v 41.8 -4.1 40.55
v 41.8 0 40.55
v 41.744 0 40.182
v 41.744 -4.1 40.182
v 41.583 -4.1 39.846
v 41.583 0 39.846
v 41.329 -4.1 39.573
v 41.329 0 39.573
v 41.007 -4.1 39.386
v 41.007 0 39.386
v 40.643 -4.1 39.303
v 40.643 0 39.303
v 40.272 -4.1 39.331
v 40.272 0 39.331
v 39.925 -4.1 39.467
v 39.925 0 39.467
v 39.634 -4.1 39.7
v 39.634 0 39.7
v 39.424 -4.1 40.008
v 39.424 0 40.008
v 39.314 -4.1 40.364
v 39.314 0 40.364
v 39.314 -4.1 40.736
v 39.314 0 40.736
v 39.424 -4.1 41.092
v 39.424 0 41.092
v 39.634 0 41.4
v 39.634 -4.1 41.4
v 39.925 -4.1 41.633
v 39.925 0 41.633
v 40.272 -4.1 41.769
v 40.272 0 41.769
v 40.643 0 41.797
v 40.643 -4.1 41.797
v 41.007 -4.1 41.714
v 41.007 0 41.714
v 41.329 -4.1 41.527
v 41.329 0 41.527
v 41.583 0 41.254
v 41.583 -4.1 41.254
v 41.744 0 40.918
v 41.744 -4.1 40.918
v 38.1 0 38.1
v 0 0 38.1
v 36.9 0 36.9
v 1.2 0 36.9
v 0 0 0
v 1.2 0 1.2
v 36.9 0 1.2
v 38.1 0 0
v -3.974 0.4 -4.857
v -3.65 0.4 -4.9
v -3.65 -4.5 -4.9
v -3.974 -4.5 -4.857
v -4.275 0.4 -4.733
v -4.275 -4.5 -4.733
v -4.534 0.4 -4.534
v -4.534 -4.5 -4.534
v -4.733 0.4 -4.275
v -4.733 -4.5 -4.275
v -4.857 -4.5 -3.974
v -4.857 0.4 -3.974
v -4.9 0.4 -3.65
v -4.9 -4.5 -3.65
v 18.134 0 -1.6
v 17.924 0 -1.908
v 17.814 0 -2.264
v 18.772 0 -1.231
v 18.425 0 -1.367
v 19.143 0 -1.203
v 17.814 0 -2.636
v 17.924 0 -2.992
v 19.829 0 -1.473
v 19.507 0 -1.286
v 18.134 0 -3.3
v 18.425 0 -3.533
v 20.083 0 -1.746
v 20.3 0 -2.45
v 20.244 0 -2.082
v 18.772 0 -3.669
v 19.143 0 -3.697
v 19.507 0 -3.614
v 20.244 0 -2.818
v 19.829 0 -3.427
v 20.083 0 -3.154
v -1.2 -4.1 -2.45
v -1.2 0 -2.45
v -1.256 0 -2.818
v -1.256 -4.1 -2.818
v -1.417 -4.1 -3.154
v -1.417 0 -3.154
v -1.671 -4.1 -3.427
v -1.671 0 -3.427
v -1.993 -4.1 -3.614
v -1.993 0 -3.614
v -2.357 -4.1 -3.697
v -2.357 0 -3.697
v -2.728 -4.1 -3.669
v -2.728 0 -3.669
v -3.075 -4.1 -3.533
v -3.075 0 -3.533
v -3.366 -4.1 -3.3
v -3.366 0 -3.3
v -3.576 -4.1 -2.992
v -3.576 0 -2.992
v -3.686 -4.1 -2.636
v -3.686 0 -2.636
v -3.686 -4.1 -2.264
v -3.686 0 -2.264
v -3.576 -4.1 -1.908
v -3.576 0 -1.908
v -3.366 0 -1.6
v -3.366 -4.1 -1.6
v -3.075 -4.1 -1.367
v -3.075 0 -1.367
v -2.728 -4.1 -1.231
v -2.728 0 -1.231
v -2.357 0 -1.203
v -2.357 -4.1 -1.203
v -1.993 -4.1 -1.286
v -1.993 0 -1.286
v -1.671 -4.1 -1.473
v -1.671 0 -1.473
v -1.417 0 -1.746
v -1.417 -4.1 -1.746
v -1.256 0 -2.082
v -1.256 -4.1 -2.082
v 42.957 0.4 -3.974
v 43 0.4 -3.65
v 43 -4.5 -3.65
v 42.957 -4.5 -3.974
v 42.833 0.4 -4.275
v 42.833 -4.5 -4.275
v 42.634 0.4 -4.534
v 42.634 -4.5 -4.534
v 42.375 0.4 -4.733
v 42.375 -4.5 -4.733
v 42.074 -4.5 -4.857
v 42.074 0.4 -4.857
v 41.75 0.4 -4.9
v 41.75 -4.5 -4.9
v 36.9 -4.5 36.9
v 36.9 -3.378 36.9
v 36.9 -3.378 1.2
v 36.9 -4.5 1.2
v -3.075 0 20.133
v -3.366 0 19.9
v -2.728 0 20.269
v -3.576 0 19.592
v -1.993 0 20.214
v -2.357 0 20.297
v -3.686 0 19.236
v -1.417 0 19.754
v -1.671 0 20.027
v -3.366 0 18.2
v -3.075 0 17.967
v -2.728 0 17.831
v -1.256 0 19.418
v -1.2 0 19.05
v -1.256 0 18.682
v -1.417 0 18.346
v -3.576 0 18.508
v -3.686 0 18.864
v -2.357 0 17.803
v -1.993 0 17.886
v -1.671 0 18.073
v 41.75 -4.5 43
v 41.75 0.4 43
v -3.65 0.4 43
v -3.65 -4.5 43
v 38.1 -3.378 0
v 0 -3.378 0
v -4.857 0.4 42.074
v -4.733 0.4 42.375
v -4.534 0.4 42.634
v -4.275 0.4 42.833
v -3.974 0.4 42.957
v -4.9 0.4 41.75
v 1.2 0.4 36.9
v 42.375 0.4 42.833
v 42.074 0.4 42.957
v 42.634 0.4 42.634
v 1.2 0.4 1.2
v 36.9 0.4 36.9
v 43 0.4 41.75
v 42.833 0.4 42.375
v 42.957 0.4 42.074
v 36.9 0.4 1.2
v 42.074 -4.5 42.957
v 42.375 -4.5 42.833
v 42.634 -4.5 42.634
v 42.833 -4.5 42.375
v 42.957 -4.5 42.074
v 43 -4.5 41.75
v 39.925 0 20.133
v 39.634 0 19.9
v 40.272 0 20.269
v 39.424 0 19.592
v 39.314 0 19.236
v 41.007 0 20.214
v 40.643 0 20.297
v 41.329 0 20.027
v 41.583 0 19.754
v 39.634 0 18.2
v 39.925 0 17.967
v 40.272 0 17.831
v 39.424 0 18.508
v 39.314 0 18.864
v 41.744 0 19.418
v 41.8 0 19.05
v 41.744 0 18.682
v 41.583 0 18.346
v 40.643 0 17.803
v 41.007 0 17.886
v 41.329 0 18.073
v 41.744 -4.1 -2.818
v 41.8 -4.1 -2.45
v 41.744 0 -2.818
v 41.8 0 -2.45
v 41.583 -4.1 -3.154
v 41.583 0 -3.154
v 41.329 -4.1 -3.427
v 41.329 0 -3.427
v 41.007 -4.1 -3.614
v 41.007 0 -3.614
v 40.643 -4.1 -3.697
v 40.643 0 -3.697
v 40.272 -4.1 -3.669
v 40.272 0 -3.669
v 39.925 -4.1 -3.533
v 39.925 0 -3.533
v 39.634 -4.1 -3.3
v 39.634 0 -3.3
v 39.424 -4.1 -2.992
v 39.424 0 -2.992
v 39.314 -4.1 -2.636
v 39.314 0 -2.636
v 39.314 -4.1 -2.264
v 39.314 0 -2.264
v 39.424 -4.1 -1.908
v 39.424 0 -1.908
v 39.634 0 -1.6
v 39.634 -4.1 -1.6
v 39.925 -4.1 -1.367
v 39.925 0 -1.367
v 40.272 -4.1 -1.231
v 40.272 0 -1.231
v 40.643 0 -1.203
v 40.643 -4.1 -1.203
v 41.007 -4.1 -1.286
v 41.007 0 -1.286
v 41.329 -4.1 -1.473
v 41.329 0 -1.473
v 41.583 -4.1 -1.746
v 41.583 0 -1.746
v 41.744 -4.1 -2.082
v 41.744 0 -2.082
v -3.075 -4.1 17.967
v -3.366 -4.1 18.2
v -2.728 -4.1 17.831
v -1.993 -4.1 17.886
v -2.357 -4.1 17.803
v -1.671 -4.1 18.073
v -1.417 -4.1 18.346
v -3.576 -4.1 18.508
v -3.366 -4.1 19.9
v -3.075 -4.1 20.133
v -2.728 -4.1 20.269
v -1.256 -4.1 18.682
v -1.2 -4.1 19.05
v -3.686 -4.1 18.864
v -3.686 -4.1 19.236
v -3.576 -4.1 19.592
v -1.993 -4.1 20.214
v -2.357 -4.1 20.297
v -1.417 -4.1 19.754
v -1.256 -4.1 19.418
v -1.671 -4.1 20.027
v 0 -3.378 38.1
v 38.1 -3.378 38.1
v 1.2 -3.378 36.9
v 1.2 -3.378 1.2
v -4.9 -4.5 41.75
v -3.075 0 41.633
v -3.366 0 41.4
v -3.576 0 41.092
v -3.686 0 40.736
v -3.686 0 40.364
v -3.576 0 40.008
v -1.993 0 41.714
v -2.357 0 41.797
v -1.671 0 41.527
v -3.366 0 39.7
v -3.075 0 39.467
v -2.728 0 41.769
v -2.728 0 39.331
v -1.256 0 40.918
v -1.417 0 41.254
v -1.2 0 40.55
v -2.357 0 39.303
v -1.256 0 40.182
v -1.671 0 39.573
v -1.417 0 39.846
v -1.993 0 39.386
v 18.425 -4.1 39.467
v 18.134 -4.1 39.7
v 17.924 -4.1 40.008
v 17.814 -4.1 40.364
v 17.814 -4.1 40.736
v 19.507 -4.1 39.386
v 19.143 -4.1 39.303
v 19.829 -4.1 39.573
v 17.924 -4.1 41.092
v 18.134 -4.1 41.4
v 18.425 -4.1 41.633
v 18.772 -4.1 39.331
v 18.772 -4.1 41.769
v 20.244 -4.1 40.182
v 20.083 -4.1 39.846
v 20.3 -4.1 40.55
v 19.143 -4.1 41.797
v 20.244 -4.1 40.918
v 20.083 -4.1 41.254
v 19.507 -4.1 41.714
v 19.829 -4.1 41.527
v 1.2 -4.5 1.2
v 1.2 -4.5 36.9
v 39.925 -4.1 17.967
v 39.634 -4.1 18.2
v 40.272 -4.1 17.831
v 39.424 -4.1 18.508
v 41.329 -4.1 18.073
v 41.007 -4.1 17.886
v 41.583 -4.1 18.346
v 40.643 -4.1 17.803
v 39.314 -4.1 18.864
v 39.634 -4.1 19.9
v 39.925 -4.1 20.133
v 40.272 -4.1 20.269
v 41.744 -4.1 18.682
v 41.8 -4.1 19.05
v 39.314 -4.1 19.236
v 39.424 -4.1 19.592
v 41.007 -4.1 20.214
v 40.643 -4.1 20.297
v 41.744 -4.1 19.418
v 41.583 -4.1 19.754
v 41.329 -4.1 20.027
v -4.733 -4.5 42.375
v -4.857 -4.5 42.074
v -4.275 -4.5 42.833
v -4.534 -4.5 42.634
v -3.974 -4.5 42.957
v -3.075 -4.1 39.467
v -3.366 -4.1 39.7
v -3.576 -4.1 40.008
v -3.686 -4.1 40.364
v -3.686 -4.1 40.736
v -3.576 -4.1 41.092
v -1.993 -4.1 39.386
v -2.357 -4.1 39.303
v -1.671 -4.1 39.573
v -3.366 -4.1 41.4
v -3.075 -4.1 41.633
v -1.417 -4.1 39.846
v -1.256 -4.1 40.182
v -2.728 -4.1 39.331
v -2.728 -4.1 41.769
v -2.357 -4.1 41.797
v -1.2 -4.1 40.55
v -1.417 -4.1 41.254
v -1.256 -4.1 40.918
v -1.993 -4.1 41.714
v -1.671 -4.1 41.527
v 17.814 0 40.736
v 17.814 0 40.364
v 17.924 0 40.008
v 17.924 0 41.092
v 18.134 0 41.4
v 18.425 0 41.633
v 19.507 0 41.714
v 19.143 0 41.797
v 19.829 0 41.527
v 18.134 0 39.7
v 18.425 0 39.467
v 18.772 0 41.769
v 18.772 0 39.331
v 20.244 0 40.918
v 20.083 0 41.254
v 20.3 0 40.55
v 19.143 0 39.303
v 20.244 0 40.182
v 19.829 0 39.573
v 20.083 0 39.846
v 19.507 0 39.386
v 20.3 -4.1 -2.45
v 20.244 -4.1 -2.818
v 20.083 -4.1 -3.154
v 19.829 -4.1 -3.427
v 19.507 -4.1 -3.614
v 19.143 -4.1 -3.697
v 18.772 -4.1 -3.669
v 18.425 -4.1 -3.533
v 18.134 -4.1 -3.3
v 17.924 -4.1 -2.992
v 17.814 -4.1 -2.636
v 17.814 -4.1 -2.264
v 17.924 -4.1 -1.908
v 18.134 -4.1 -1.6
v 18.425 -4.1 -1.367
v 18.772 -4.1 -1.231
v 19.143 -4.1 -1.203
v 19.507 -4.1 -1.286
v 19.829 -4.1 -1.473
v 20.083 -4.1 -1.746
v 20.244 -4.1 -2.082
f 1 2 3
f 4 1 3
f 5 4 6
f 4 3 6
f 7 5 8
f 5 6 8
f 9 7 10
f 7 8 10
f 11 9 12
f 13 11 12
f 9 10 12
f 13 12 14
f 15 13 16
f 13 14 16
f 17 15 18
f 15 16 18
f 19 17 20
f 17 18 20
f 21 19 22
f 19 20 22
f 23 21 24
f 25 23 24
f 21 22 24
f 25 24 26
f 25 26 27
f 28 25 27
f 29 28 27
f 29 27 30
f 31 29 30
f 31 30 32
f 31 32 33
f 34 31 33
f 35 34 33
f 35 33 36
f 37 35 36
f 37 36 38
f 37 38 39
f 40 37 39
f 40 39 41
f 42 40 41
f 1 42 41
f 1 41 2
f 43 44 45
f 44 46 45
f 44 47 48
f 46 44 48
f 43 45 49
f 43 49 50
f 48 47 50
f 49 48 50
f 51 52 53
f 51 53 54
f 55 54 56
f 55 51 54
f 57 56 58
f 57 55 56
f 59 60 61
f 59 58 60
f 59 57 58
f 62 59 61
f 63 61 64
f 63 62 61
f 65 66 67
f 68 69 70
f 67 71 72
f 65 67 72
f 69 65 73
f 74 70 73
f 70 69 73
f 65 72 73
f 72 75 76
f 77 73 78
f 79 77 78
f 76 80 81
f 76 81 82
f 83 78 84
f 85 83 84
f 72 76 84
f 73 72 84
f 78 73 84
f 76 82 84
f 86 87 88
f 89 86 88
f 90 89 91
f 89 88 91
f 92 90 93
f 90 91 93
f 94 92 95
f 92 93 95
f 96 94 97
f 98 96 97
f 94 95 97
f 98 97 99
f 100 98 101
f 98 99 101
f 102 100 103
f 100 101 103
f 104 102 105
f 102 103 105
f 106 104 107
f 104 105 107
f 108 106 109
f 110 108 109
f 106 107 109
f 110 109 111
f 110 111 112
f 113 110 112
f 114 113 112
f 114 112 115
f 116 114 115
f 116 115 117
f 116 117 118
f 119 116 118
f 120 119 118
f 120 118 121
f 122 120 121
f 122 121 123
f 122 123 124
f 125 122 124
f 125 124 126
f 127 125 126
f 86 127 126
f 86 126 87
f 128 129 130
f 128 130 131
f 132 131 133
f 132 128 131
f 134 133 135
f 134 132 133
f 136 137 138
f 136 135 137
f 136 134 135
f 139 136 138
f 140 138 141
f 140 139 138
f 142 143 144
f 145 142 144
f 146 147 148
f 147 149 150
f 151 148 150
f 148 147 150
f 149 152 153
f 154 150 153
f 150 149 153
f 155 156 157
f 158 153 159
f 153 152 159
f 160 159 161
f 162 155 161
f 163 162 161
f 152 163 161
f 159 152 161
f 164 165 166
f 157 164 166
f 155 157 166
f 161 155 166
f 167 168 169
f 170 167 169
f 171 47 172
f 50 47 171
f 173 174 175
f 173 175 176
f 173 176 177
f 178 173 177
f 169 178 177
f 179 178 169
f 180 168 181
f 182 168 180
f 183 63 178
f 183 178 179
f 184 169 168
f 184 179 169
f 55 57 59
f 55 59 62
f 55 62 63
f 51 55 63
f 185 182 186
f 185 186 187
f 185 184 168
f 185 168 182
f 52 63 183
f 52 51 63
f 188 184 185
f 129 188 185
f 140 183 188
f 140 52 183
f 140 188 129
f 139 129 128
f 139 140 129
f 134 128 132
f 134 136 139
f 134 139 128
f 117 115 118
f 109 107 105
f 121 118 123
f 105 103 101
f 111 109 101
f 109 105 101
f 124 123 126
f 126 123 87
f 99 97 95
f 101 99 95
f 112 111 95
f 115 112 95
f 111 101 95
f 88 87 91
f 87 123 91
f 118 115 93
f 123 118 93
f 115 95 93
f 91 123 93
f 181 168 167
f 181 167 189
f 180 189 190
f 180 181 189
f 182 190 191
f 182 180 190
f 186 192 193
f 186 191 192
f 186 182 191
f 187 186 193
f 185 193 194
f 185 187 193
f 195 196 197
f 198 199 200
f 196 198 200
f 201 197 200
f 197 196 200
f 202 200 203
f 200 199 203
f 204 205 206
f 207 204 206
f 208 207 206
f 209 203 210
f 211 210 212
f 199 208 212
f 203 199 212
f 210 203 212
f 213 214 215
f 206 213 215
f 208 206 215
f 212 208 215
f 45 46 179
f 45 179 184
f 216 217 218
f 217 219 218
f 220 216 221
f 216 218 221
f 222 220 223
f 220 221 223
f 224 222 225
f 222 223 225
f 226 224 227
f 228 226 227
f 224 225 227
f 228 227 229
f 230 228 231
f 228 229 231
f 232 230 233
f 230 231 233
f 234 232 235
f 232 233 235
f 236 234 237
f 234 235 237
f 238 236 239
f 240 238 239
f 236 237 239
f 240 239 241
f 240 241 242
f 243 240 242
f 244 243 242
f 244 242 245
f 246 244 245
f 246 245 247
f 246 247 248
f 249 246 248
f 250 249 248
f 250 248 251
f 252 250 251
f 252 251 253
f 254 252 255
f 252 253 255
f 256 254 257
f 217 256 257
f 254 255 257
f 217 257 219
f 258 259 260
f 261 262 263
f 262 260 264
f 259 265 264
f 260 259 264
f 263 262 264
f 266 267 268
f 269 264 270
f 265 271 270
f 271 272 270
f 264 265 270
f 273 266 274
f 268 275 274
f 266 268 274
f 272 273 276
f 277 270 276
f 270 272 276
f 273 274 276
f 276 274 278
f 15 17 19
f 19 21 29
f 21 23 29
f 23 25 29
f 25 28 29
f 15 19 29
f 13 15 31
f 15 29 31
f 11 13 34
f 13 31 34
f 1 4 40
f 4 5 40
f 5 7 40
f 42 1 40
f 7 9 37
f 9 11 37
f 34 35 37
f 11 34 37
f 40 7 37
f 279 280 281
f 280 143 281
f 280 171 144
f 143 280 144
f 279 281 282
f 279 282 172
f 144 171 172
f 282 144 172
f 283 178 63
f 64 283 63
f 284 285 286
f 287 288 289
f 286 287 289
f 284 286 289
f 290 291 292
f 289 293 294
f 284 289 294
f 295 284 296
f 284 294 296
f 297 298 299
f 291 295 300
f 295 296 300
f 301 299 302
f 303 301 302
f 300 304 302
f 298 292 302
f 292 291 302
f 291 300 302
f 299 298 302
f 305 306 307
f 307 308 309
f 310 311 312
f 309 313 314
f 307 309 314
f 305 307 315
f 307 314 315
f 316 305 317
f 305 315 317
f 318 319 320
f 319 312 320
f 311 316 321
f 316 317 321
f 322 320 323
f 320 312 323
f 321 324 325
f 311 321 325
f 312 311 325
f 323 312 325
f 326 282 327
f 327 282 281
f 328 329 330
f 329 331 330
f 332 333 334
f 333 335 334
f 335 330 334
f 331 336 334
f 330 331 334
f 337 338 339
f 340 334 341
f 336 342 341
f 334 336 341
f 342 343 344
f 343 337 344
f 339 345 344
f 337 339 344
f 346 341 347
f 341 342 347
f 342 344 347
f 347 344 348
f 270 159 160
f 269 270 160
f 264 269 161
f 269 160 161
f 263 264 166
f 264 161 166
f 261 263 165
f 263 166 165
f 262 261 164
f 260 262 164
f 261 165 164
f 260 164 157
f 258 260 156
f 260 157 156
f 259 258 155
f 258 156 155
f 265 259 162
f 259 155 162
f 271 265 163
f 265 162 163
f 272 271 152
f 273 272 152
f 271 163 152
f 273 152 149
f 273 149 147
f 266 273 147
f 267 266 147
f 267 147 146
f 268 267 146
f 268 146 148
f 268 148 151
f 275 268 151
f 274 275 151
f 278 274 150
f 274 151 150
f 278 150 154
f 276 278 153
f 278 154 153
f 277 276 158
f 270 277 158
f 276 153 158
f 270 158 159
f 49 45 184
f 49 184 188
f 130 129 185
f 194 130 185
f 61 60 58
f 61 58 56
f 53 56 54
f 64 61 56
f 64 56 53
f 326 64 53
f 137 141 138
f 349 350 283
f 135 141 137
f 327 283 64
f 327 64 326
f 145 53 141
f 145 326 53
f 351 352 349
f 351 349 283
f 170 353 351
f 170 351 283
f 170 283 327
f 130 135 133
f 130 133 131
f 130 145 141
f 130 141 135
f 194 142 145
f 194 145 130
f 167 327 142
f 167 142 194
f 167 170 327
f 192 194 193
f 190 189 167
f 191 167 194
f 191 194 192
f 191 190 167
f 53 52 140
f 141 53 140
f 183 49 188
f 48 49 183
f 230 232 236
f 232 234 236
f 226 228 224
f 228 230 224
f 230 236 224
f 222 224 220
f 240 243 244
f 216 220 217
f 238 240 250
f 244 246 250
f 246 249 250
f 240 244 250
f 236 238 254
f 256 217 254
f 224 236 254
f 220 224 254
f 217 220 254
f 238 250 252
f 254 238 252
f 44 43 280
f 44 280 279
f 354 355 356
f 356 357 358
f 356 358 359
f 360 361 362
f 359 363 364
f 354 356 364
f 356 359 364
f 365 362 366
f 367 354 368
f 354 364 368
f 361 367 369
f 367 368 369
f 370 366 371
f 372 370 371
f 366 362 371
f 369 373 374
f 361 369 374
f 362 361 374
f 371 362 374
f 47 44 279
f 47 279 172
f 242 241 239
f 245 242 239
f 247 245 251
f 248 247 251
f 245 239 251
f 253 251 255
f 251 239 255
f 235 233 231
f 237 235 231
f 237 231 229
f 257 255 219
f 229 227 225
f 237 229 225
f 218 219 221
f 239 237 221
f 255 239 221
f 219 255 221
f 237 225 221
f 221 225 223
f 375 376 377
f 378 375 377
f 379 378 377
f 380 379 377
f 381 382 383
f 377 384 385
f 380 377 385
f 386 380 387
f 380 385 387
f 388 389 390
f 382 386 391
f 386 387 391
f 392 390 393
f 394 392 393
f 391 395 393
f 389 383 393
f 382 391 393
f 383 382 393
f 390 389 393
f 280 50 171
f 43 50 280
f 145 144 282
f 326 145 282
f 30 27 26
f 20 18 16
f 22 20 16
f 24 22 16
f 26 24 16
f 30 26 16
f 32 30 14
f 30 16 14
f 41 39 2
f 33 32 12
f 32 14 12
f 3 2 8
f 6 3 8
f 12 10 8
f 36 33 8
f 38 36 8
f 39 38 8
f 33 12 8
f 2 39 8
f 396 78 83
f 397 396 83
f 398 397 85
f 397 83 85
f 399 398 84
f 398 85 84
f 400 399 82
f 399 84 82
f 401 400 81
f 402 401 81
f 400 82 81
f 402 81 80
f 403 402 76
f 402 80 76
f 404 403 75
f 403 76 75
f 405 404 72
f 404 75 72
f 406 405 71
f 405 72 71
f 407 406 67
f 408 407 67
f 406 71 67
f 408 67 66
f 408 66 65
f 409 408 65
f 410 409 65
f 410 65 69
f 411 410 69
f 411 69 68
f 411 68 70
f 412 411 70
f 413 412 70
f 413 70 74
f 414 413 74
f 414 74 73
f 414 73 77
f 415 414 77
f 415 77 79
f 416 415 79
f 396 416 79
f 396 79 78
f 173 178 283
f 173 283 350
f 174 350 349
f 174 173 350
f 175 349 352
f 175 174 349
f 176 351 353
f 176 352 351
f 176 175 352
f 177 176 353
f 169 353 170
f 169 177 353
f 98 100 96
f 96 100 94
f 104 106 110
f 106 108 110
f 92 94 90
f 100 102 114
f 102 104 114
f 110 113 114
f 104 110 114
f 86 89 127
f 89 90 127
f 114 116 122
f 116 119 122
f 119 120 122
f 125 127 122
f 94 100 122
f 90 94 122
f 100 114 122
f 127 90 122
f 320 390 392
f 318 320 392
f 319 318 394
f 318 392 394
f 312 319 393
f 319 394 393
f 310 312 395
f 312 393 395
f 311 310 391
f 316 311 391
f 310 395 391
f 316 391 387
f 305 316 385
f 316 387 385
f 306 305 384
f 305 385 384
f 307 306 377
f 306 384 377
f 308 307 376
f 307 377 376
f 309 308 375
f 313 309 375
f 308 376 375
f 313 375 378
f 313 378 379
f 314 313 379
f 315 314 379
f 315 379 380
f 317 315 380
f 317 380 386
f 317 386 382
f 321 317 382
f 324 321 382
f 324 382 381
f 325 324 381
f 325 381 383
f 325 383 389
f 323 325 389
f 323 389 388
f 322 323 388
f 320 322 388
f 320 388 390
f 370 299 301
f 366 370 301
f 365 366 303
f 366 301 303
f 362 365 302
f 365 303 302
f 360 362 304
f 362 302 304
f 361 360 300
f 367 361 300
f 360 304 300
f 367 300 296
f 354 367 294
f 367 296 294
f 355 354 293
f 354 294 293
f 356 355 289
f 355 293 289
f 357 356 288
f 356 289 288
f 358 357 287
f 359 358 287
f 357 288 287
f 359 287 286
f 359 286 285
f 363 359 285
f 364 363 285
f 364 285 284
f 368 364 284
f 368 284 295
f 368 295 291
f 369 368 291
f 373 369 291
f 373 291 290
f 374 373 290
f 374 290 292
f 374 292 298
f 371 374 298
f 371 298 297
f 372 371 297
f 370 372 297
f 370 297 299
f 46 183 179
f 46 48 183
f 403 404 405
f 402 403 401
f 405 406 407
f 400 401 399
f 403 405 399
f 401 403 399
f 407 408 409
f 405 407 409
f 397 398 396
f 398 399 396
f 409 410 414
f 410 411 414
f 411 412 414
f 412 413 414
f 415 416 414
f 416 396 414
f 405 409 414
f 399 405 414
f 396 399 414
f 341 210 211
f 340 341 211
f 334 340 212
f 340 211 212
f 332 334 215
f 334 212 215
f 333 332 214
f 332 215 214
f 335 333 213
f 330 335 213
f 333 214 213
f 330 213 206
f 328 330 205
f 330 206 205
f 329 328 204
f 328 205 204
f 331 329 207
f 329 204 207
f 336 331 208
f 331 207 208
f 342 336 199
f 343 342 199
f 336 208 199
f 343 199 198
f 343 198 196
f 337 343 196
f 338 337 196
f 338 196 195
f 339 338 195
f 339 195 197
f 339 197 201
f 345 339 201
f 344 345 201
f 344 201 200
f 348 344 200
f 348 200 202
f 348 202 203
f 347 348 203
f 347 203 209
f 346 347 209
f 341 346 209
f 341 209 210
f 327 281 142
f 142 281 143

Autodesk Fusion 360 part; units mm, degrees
sketch "Sketch1" plane through (0, 0, 0) normal (0, 1, 0) x (1, 0, 0)
  line L0 (0, 0) -> (38.1, 0)
  line L1 (38.1, 0) -> (38.1, -38.1)
  line L2 (38.1, -38.1) -> (0, -38.1)
  line L3 (0, -38.1) -> (0, 0)
  circle A0 centre (19.05, -40.55) radius 1.25
  line L4 (-4.9, -39.3) -> (43, -39.3) construction
  line L5 (-4.9, -41.8) -> (43, -41.8) construction
  line L6 (0, -19.05) -> (38.1, -19.05)
  line L7 (19.05, 0) -> (19.05, -38.1)
  line L8 (-3.65, 4.9) -> (41.75, 4.9)
  line L9 (43, 3.65) -> (43, -41.75)
  line L10 (41.75, -43) -> (-3.65, -43)
  line L11 (-4.9, -41.75) -> (-4.9, 3.65)
  circle A1 centre (-2.45, -40.55) radius 1.25
  line L12 (-3.7, -43) -> (-3.7, 4.9) construction
  line L13 (-1.2, -43) -> (-1.2, 4.9) construction
  line L14 (39.3, -43) -> (39.3, 4.9) construction
  line L15 (41.8, 4.9) -> (41.8, -43) construction
  line L16 (-4.9, 3.7) -> (43, 3.7) construction
  line L17 (43, 1.2) -> (-4.9, 1.2) construction
  circle A2 centre (40.55, -40.55) radius 1.25
  circle A3 centre (40.55, -19.05) radius 1.25
  circle A4 centre (40.55, 2.45) radius 1.25
  circle A5 centre (19.05, 2.45) radius 1.25
  circle A6 centre (-2.45, 2.45) radius 1.25
  circle A7 centre (-2.45, -19.05) radius 1.25
  arc A8 (-4.9, -41.75) -> (-3.65, -43) centre (-3.65, -41.75) ccw
  arc A9 (41.75, -43) -> (43, -41.75) centre (41.75, -41.75) ccw
  arc A10 (43, 3.65) -> (41.75, 4.9) centre (41.75, 3.65) ccw
  arc A11 (-3.65, 4.9) -> (-4.9, 3.65) centre (-3.65, 3.65) ccw
  line L18 (1.2, -36.9) -> (36.9, -36.9)
  line L19 (36.9, -36.9) -> (36.9, -1.2)
  line L20 (36.9, -1.2) -> (1.2, -1.2)
  line L21 (1.2, -1.2) -> (1.2, -36.9)
  dimension "d1" = 38.1
  dimension "d2" = 38.1
  dimension "d3" = 2.5
  dimension "d4" = 1.2
  dimension "d5" = 1.2
  dimension "d8" = 2.5
  dimension "d9" = 1.2
  dimension "d10" = 1.2
  dimension "d11" = 1.2
  dimension "d13" = 1.2
  dimension "d14" = 1.2
  dimension "d15" = 1.2
  dimension "d16" = 2.5
  dimension "d17" = 1.25
  dimension "d18" = 1.2
  dimension "d19" = 1.2
  dimension "d20" = 1.2
  dimension "d21" = 1.2
extrude "Extrude1" add sketch "Sketch1" along normal blind 0.4 contours L0 L3 L6 L7 L20 L21 | L0 L1 L6 L7 L19 L20 | L2 L3 L6 L7 L18 L21 | L1 L2 L6 L7 L18 L19 | A0 | L8 L9 L10 L11 A8 A9 A10 A11 | A1 | A2 | A3 | A4 | A5 | A6 | A7
extrude "Extrude2" add sketch "Sketch1" against normal blind 4.1
ref_plane "WorkPlane1" through (19.05, -3.3782, 19.05) normal (0, -1, 0) x (-1, 0, 0)
sketch "Sketch2" plane through (0, -3.3782, 0) normal (0, -1, 0) x (-1, 0, 0)
  line L0 (-1.2, -1.2) -> (-1.2, -36.9)
  line L1 (-1.2, -36.9) -> (-36.9, -36.9)
  line L2 (-36.9, -36.9) -> (-36.9, -1.2)
  line L3 (-36.9, -1.2) -> (-1.2, -1.2)
  line L4 (0, -38.1) -> (0, 0)
  line L5 (0, 0) -> (-38.1, 0)
  line L6 (-38.1, 0) -> (-38.1, -38.1)
  line L7 (-38.1, -38.1) -> (0, -38.1)
extrude "Extrude3" add sketch "Sketch2" along normal up to surface (0.7218 mm away)
sketch "Sketch3" plane through (0, -4.1, 0) normal (0, -1, 0) x (1, 0, 0)
  line L0 (1.2, 36.9) -> (36.9, 36.9)
  line L1 (36.9, 36.9) -> (36.9, 1.2)
  line L2 (36.9, 1.2) -> (1.2, 1.2)
  line L3 (1.2, 1.2) -> (1.2, 36.9)
  circle A0 centre (40.55, 19.05) radius 1.25
  circle A1 centre (-2.45, 19.05) radius 1.25
  circle A2 centre (19.05, -2.45) radius 1.25
  circle A3 centre (40.55, 40.55) radius 1.25
  circle A4 centre (40.55, -2.45) radius 1.25
  circle A5 centre (19.05, 40.55) radius 1.25
  circle A6 centre (-2.45, -2.45) radius 1.25
  circle A7 centre (-2.45, 40.55) radius 1.25
  arc A8 (41.75, -4.9) -> (43, -3.65) centre (41.75, -3.65) ccw
  line L4 (43, -3.65) -> (43, 41.75)
  arc A9 (43, 41.75) -> (41.75, 43) centre (41.75, 41.75) ccw
  line L5 (41.75, 43) -> (-3.65, 43)
  arc A10 (-3.65, 43) -> (-4.9, 41.75) centre (-3.65, 41.75) ccw
  line L6 (-4.9, 41.75) -> (-4.9, -3.65)
  arc A11 (-4.9, -3.65) -> (-3.65, -4.9) centre (-3.65, -3.65) ccw
  line L7 (-3.65, -4.9) -> (41.75, -4.9)
extrude "Extrude4" add sketch "Sketch3" along normal blind 0.4 contours A0 | A1 | A2 | A3 | A4 | A5 | A6 | A7 | A8 L4 A9 L5 A10 L6 A11 L7
equation "d2 = d1"
equation "d5 = d4"
equation "d8 = d3"
equation "d9 = d5"
equation "d10 = d5"
equation "d11 = d5"
equation "d13 = d5"
equation "d14 = d5"
equation "d15 = d5"
equation "d16 = d3"
equation "d17 = d3 / 2"
equation "d19 = d18"
equation "d20 = d18"
equation "d21 = d18"
